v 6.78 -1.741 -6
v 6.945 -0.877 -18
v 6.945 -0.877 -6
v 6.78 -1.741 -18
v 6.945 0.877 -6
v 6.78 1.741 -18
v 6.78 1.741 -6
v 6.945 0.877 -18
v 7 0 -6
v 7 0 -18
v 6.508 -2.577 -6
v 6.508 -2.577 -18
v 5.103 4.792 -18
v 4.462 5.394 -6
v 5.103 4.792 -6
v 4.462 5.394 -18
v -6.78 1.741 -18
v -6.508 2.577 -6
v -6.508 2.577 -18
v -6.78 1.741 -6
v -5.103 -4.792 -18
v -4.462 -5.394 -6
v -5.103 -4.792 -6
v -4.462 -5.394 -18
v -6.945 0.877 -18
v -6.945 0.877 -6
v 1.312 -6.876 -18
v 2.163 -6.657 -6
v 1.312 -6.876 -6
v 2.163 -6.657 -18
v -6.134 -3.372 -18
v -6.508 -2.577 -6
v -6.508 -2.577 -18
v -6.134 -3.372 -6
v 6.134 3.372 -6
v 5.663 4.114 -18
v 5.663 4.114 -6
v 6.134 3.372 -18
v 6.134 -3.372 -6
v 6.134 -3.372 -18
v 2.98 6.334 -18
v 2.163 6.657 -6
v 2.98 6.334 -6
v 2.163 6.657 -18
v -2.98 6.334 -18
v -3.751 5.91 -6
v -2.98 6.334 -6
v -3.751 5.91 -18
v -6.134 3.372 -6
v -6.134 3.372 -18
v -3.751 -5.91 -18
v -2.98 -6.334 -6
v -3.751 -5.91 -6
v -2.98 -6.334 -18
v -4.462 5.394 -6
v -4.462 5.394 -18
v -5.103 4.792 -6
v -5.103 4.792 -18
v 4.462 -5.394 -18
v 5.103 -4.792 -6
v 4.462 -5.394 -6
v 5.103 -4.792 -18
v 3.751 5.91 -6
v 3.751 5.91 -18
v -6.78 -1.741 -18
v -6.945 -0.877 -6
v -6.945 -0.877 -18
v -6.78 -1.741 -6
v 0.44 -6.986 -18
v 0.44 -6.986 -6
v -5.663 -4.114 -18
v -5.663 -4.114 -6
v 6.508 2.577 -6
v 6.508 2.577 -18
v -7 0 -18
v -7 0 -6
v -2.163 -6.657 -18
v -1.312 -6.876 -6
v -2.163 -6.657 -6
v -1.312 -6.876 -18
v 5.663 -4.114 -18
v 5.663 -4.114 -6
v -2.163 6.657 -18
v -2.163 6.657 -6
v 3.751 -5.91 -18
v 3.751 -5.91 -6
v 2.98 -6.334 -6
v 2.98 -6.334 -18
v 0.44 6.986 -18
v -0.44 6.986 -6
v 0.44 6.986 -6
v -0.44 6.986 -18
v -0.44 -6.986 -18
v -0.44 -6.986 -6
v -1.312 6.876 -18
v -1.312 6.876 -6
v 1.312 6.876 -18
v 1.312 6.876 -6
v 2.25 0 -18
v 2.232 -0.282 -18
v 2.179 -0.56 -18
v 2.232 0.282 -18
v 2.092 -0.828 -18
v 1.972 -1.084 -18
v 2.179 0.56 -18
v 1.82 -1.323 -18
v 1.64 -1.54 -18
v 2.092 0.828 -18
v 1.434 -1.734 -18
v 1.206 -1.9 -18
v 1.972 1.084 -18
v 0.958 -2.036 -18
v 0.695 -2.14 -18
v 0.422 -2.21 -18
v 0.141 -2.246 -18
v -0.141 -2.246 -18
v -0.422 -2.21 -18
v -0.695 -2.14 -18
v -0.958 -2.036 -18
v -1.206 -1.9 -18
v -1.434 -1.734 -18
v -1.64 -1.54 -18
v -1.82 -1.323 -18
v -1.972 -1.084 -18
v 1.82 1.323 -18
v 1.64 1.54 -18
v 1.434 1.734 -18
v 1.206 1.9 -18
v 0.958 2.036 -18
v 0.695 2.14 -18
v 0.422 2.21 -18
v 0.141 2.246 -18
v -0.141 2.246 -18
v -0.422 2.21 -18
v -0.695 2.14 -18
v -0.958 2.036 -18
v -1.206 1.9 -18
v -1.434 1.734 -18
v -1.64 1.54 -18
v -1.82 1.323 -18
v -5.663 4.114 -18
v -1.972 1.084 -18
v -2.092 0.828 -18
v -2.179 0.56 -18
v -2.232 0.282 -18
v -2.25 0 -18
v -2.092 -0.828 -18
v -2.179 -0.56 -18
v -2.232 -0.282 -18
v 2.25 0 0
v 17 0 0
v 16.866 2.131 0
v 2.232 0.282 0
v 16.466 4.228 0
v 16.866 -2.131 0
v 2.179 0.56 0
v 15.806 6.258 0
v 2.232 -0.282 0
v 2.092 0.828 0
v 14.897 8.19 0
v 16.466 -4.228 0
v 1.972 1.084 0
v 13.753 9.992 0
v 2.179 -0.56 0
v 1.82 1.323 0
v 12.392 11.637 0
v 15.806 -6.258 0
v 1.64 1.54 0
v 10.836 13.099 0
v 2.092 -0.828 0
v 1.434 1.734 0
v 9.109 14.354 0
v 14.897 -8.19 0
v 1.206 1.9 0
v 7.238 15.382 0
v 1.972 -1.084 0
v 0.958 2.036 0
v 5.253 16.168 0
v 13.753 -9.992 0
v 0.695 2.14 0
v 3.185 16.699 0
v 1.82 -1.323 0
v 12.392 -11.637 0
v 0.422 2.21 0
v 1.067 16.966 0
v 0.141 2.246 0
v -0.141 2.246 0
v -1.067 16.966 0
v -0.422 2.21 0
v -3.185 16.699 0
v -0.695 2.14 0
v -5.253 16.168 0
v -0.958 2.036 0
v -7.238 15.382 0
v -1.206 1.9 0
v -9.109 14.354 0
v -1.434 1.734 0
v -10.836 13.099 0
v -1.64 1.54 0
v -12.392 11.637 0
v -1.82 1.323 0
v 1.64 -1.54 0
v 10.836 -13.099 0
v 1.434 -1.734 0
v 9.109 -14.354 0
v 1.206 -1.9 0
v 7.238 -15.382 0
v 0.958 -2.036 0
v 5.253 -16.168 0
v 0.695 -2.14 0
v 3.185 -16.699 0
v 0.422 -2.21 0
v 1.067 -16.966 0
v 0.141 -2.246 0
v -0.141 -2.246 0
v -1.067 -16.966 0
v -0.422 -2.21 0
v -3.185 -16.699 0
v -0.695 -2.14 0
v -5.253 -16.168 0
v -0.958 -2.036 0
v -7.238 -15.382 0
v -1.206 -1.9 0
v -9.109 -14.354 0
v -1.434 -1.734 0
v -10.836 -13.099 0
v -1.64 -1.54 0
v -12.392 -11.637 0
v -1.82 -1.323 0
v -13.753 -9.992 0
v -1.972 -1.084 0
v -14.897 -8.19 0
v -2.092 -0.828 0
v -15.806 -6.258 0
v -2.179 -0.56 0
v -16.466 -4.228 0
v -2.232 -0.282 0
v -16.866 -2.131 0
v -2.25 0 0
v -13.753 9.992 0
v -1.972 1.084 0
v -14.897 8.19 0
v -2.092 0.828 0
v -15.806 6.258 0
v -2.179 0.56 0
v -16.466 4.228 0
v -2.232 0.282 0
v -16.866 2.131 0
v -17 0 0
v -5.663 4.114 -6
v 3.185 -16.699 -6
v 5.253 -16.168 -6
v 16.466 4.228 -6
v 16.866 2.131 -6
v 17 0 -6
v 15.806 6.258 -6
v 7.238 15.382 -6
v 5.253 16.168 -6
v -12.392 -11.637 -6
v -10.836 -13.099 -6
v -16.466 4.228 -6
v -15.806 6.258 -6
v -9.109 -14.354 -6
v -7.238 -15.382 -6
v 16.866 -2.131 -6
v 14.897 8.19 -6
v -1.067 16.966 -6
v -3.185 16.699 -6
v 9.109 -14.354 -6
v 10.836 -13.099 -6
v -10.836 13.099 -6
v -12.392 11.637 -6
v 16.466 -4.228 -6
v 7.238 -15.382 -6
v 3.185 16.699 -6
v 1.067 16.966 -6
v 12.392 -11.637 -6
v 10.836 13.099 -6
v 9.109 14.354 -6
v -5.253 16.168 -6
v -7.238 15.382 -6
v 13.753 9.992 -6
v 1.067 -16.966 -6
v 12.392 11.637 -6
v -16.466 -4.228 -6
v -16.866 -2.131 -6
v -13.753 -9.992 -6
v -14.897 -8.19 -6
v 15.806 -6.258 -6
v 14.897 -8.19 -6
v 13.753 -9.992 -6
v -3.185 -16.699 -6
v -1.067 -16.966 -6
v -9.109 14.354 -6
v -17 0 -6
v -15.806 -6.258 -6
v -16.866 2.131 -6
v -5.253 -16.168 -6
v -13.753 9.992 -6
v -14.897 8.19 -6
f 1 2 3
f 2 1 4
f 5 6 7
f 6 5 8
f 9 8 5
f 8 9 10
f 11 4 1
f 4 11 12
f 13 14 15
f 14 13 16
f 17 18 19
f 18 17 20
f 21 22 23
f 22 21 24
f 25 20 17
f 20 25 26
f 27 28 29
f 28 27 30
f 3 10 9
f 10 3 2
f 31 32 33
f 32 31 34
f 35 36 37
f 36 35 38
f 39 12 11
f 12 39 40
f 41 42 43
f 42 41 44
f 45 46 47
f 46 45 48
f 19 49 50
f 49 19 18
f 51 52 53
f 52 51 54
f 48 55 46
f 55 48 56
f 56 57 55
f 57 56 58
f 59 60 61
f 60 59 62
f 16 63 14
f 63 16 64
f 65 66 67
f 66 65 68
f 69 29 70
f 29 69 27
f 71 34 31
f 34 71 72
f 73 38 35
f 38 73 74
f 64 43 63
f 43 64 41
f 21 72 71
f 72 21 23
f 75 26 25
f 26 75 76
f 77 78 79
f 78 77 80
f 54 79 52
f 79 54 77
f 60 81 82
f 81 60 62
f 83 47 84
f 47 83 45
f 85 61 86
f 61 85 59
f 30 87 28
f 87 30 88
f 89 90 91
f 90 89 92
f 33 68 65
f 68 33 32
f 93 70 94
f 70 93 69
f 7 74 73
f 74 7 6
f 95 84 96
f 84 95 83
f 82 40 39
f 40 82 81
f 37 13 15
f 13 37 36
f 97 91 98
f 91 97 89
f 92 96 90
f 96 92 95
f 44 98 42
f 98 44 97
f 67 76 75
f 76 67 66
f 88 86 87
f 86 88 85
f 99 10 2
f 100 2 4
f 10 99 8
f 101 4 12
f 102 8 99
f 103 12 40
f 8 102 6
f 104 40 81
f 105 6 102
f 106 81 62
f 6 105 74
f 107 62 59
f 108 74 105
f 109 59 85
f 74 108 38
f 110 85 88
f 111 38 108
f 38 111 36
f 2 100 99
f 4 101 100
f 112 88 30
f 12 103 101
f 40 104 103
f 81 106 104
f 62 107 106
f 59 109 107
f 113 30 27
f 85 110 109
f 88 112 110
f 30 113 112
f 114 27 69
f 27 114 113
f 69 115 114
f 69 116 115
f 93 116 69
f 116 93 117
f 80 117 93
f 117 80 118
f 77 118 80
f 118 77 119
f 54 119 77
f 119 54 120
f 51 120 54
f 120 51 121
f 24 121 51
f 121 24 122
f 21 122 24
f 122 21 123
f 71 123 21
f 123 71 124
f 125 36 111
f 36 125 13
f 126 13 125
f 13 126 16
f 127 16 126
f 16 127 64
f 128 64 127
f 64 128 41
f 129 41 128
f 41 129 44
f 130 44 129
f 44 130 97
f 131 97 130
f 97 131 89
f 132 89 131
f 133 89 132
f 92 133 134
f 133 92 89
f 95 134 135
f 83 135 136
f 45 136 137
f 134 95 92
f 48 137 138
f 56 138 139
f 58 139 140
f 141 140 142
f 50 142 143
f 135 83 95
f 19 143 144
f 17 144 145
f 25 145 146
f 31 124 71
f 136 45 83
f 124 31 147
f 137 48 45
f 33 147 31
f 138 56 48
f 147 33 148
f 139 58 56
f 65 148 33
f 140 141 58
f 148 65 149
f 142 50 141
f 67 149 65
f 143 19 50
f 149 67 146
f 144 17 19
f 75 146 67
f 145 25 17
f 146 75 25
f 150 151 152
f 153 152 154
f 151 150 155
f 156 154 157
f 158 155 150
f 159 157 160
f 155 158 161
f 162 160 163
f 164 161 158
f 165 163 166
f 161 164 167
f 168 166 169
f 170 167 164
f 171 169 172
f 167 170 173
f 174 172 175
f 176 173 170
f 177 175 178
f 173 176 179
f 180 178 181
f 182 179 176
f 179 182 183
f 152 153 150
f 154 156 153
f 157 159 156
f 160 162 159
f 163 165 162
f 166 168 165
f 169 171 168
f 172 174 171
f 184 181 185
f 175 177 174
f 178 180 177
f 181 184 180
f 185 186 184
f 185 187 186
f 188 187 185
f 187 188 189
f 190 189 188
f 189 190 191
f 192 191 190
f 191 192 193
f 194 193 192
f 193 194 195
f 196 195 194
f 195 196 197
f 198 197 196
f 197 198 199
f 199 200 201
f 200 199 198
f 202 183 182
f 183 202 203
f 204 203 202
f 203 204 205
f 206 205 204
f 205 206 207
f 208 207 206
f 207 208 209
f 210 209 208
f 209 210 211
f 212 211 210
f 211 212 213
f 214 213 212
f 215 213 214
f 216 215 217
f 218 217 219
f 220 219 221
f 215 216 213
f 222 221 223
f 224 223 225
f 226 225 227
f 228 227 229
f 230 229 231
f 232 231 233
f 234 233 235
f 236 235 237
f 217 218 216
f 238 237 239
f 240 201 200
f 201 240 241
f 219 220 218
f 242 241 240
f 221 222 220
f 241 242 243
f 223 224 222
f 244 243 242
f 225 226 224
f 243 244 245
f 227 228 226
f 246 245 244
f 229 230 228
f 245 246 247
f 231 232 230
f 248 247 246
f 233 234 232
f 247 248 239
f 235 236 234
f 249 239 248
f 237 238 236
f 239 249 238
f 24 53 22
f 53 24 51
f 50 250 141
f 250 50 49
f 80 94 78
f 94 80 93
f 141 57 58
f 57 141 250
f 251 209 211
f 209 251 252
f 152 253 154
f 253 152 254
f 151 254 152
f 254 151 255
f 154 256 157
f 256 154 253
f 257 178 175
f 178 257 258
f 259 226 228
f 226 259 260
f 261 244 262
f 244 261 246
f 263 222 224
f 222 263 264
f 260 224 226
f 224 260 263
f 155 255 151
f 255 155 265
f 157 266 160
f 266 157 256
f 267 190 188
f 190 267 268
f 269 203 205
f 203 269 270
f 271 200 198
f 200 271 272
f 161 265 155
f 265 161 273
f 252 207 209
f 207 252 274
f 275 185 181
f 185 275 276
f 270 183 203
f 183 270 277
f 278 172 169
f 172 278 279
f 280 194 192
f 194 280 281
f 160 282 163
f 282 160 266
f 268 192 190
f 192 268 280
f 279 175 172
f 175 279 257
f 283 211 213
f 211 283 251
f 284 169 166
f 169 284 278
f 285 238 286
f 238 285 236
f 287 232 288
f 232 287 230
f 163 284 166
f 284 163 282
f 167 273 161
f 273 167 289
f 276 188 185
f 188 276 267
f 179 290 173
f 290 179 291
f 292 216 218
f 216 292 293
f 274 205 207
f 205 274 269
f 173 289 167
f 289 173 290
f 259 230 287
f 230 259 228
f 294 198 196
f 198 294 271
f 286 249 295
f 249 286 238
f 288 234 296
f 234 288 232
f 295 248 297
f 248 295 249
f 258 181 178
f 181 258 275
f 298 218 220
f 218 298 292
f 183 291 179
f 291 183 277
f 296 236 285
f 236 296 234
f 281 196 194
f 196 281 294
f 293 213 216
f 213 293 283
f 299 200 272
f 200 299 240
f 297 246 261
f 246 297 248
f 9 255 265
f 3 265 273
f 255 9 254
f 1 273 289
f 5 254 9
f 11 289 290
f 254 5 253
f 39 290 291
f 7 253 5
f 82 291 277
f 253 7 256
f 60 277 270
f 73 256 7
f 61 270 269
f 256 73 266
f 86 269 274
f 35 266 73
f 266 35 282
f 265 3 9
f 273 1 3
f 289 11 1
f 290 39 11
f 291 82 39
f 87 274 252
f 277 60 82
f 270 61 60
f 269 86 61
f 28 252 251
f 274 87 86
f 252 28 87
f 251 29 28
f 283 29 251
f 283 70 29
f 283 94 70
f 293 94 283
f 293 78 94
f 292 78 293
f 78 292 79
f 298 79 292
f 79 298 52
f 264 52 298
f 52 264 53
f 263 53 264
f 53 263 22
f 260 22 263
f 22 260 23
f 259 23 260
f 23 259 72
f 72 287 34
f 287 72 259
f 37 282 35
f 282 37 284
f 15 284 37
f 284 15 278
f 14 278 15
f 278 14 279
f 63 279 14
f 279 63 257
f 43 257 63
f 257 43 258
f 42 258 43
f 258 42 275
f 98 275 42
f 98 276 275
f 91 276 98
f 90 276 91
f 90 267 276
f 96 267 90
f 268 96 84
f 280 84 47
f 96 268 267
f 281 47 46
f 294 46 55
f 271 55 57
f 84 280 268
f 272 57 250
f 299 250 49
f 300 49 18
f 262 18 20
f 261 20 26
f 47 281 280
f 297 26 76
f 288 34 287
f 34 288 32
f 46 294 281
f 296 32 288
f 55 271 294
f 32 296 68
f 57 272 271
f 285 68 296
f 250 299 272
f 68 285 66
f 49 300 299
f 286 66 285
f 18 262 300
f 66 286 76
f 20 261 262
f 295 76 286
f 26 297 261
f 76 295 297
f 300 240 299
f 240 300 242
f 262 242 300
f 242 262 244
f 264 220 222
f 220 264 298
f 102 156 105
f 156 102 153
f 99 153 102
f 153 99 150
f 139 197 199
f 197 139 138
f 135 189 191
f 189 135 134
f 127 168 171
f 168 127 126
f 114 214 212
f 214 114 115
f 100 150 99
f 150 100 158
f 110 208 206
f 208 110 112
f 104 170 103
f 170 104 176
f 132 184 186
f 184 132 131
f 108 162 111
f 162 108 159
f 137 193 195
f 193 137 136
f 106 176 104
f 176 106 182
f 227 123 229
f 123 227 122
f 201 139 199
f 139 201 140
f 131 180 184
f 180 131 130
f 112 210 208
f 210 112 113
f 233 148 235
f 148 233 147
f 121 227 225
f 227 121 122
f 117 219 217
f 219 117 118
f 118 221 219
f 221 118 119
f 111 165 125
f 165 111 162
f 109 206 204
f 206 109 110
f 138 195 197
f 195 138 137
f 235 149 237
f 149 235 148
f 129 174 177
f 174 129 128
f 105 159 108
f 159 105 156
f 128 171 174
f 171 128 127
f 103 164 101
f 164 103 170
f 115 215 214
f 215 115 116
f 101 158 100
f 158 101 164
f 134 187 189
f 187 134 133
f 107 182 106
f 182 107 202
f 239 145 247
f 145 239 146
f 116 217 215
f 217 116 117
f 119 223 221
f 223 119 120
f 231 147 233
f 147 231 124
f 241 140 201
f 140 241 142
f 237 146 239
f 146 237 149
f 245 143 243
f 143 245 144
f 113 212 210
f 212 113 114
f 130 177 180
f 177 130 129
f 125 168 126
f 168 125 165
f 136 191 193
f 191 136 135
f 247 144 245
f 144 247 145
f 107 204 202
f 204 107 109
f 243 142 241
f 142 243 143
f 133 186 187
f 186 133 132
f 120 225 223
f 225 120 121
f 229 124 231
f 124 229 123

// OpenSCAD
$fn = 50;


difference() {
	union() {
		translate(v = [0, 0, -18.0000000000]) {
			cylinder(h = 18, r = 7.0000000000);
		}
		translate(v = [0, 0, -6.0000000000]) {
			cylinder(h = 6, r = 17.0000000000);
		}
	}
	union() {
		#translate(v = [0, 0, -18]) {
			cylinder(h = 18, r = 2.2500000000);
		}
	}
}
